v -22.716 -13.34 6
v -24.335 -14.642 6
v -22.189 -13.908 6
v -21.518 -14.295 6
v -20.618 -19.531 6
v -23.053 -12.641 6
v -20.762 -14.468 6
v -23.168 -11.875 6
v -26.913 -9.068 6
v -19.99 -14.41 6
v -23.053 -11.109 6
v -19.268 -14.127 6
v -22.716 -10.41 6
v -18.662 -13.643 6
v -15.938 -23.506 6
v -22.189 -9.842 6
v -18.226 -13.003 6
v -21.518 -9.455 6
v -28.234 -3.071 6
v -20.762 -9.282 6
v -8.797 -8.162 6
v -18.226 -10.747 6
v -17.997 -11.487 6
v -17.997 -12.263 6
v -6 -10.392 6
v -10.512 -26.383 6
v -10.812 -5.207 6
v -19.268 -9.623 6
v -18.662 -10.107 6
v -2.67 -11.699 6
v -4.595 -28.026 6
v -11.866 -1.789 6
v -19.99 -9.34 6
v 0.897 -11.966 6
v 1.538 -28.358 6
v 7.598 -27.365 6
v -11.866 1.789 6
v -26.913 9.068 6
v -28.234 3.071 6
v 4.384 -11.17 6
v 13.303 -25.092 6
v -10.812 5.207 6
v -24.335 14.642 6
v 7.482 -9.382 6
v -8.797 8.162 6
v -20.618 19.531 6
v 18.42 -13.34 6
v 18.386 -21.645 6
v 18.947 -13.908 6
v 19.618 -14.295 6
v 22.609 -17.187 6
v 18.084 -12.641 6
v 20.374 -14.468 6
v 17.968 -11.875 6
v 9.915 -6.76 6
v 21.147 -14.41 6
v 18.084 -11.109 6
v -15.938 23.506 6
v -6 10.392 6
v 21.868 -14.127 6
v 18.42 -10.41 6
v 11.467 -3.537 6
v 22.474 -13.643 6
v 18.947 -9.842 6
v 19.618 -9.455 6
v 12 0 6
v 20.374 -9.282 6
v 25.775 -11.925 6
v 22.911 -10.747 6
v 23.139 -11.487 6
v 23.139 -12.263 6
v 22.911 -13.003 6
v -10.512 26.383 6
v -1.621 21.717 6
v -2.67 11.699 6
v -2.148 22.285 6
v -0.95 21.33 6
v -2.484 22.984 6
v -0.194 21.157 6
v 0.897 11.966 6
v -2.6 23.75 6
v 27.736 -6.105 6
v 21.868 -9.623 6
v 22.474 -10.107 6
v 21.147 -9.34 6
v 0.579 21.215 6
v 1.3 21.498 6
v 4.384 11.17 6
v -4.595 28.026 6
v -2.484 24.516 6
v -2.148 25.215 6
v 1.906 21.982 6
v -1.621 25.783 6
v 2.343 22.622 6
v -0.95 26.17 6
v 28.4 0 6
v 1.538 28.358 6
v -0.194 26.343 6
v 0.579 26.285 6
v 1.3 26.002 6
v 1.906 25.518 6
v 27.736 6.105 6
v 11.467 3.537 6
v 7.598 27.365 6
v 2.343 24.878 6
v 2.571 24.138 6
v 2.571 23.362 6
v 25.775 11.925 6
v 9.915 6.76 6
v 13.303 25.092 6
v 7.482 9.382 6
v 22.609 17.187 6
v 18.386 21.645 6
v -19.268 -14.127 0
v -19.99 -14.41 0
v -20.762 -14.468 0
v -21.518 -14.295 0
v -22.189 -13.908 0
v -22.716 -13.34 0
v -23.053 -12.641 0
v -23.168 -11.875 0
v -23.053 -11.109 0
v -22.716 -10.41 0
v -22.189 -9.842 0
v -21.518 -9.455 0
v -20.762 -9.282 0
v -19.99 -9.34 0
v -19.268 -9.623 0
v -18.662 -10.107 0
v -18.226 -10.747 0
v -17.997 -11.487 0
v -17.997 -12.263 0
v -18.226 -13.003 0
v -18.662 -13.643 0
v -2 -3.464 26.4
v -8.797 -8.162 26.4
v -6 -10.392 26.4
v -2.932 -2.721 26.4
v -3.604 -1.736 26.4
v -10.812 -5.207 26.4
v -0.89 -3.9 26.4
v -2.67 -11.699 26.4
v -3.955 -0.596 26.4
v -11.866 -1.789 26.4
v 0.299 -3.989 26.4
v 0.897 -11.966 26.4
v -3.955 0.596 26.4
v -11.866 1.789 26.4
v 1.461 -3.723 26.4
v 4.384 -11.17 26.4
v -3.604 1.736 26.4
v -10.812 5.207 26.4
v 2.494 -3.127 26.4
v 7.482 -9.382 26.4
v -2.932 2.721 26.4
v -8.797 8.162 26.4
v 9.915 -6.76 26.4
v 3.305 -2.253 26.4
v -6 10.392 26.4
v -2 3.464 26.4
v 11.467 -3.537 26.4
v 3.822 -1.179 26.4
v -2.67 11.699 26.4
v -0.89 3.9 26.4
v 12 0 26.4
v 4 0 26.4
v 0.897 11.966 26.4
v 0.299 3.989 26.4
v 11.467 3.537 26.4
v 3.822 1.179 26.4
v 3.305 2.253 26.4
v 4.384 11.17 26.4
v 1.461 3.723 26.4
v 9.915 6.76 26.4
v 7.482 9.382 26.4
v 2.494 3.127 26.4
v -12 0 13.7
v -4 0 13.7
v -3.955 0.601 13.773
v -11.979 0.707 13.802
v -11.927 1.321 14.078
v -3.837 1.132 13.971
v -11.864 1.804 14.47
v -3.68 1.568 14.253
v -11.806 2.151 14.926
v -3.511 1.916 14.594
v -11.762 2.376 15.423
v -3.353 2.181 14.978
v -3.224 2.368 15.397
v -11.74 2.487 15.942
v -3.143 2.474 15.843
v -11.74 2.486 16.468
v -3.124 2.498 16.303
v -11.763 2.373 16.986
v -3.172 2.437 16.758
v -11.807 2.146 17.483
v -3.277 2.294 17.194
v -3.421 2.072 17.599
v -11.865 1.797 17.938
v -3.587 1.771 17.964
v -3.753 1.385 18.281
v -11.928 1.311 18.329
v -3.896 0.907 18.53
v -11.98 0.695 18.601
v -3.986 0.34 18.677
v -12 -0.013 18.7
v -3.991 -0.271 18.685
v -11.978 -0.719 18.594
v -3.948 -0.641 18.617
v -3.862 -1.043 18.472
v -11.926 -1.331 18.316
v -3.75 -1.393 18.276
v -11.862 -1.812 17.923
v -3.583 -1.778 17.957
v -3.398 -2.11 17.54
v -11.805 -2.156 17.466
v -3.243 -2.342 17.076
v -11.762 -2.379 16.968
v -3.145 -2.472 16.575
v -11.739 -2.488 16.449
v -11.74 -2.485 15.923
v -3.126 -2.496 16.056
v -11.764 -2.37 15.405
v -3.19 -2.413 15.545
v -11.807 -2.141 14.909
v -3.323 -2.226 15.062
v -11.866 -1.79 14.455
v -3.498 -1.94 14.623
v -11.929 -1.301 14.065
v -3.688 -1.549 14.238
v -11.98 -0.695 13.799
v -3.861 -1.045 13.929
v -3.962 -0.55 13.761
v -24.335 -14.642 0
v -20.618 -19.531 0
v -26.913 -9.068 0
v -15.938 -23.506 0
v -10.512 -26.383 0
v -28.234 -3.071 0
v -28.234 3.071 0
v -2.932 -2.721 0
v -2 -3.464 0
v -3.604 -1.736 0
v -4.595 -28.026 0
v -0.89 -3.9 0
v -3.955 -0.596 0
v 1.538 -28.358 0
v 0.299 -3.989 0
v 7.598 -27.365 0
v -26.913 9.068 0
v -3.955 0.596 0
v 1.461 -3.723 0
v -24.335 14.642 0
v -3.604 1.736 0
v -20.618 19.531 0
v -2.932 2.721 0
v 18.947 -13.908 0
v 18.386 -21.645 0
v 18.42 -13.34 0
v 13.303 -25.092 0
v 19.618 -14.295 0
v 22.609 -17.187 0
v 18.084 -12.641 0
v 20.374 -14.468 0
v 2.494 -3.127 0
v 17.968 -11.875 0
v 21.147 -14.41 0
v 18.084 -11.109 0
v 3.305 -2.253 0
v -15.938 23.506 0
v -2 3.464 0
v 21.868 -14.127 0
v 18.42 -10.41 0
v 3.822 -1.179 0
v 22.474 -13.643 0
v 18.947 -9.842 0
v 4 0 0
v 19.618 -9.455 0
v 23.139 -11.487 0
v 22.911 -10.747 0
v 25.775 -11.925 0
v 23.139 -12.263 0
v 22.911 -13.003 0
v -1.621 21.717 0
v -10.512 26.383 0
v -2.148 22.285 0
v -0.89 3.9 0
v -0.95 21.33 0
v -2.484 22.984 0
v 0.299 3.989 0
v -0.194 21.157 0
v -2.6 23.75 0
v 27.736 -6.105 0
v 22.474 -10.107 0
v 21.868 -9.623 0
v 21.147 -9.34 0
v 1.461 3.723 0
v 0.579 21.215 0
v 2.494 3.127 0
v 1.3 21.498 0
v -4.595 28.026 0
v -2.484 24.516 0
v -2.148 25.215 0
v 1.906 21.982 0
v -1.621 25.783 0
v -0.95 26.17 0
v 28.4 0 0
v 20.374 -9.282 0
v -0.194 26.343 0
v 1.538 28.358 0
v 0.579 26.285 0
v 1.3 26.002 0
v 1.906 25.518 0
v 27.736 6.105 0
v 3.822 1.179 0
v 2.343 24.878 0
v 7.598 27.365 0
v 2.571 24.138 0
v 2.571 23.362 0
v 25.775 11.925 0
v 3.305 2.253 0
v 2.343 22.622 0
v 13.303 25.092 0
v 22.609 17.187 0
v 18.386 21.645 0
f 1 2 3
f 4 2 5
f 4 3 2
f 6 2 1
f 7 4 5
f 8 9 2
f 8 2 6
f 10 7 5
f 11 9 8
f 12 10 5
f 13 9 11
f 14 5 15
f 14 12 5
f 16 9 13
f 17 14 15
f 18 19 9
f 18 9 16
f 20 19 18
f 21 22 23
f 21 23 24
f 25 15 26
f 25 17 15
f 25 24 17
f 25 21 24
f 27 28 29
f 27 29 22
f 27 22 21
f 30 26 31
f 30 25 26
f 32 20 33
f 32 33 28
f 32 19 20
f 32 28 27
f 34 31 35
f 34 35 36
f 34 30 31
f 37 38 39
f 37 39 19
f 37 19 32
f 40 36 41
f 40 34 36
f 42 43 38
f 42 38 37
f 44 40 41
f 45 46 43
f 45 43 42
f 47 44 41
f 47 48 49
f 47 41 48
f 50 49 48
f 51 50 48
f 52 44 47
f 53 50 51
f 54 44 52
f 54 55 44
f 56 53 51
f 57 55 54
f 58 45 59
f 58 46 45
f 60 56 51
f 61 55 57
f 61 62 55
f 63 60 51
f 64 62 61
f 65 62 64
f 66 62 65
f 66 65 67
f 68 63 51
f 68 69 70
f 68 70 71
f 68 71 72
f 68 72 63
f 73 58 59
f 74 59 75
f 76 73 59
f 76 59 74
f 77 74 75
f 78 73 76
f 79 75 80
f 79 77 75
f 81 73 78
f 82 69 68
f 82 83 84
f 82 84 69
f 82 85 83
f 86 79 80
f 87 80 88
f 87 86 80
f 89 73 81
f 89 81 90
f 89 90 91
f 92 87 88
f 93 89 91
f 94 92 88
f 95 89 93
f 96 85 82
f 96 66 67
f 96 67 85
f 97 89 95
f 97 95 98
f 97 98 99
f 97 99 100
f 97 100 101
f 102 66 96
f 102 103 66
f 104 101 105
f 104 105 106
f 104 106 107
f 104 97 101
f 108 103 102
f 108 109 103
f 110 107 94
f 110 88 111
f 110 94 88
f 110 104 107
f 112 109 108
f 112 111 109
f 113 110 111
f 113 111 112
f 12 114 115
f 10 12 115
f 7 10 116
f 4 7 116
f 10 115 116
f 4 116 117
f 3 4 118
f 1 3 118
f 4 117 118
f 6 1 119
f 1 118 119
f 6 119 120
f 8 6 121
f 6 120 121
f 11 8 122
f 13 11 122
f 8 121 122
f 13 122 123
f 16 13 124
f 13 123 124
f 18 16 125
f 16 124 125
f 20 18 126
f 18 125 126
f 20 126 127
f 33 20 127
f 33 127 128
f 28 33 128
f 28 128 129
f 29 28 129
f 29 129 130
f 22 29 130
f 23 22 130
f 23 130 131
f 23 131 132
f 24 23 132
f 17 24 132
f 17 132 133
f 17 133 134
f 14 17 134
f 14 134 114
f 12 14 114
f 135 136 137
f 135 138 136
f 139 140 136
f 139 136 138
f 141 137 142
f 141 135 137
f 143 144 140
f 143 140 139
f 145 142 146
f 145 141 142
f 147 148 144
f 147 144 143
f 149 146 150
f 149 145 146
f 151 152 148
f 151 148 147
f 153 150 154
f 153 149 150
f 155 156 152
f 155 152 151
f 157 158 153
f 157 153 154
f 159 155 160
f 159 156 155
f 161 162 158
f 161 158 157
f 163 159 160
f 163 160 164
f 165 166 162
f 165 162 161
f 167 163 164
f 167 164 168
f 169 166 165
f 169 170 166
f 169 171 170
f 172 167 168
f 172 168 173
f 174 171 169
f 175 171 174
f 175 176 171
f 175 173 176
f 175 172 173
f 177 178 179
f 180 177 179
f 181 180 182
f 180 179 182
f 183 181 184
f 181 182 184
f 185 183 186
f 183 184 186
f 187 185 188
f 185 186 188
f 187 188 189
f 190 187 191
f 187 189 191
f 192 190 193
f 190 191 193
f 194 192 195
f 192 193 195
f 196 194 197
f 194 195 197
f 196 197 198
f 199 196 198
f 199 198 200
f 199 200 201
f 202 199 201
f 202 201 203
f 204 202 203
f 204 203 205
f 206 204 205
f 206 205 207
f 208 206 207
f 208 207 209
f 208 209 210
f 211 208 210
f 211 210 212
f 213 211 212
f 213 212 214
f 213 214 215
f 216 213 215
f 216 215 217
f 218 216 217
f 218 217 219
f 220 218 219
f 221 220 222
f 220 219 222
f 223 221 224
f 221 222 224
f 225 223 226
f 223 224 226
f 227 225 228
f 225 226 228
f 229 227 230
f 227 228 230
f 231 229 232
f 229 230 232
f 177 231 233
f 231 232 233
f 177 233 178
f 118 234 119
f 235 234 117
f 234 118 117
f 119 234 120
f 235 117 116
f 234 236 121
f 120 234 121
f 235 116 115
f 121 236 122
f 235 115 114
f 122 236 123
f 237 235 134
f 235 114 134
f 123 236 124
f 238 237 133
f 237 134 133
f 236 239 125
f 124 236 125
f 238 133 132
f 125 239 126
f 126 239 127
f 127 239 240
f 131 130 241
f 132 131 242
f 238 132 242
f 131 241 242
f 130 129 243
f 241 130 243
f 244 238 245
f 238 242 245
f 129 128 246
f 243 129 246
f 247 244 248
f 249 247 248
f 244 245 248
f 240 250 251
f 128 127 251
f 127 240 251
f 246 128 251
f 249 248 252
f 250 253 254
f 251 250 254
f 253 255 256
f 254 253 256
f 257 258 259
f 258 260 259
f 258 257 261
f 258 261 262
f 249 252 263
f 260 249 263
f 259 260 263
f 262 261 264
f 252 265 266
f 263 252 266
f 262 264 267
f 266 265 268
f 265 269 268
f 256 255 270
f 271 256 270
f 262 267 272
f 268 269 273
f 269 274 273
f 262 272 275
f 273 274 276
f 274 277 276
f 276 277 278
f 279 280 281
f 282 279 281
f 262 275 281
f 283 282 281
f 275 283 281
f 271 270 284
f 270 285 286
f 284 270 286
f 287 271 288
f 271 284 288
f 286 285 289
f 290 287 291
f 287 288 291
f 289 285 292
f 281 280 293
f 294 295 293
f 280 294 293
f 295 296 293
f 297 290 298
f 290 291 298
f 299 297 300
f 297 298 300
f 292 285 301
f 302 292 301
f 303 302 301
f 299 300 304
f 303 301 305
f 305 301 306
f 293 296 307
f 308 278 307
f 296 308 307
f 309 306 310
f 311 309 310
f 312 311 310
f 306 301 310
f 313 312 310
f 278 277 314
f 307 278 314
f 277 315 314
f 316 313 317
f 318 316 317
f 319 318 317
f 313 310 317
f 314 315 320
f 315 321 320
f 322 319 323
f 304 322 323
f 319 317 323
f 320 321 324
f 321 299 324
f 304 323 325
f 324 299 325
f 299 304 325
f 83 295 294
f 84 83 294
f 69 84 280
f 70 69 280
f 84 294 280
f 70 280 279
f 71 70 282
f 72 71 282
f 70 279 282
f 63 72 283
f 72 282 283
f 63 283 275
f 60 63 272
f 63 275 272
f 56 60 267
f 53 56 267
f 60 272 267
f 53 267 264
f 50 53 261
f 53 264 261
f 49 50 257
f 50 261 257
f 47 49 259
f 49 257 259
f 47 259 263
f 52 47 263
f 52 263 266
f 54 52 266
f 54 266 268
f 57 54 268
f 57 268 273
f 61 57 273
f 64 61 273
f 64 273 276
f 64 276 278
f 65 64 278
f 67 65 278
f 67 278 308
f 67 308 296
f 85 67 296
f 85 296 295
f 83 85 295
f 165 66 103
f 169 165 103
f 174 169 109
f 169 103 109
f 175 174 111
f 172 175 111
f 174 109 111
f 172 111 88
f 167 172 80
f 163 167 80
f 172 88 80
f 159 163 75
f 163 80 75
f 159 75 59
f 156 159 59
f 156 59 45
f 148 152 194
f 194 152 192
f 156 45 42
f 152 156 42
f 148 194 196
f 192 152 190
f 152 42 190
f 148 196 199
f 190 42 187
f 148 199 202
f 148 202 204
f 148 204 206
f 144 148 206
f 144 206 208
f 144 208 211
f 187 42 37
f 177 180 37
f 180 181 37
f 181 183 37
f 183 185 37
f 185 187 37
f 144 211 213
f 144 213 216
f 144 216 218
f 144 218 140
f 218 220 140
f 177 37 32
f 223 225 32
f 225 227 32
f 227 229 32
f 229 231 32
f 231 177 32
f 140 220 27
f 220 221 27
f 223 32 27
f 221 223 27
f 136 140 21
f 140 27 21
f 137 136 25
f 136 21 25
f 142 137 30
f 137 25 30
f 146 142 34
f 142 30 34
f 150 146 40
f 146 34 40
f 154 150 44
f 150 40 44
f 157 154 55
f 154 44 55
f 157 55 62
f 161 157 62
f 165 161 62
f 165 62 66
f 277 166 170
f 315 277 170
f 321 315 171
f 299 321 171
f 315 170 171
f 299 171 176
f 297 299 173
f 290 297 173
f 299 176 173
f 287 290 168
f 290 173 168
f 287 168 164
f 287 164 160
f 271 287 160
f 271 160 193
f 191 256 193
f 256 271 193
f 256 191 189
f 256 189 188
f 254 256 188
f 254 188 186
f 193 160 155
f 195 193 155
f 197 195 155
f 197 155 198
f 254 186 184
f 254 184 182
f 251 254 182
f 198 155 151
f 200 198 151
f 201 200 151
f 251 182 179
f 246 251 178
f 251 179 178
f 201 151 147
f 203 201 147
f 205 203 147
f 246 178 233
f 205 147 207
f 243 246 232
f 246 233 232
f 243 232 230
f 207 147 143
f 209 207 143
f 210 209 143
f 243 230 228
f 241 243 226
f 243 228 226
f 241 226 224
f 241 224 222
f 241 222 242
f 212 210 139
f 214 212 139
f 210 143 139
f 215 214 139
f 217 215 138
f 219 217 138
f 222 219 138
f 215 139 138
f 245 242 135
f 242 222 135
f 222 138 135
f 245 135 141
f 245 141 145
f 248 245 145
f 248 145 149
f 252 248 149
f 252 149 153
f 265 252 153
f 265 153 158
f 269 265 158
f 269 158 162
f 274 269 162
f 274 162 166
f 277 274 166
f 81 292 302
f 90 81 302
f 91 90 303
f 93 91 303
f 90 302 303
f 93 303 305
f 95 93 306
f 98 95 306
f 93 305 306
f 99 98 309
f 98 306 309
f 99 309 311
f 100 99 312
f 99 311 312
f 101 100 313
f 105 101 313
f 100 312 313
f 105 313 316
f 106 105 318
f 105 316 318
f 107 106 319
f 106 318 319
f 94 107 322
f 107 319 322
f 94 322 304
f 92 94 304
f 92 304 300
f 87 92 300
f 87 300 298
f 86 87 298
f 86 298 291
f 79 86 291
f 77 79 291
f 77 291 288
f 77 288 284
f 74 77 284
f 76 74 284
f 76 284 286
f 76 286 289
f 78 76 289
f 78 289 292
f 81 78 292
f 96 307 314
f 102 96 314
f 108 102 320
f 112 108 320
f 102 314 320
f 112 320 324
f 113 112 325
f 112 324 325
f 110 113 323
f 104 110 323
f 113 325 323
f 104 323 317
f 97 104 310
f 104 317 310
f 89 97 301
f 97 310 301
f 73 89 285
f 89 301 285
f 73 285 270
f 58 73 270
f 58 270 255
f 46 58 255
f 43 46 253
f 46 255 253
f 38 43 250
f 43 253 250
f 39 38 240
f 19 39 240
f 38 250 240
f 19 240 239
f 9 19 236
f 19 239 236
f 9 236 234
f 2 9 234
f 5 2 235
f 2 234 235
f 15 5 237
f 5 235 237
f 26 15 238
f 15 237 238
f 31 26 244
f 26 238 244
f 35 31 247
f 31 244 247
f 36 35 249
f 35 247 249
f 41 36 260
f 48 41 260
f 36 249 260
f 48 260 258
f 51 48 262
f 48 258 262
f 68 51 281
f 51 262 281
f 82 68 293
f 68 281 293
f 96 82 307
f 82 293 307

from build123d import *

# Parameters (mm, degrees)
SKETCH2_R           = 28.4
BOSS_EXTRUDE1_DEPTH = 6
SKETCH3_R           = 12
BOSS_EXTRUDE2_DEPTH = 20.4
SKETCH4_R           = 4
CUT_EXTRUDE1_DEPTH  = 49.063291606
SKETCH5_R           = 2.6
CUT_EXTRUDE2_DEPTH  = 49.063291606
CIRPATTERN2_COUNT   = 3
SKETCH6_R           = 2.5
CUT_EXTRUDE3_DEPTH  = 49.063291606


with BuildPart() as part:
    # Sketch2 → Boss-Extrude1 (new body)
    with BuildSketch(Plane.XY):
        Circle(SKETCH2_R)
    extrude(amount=BOSS_EXTRUDE1_DEPTH)

    # Sketch3 → Boss-Extrude2 (add)
    with BuildSketch(Plane.XY.offset(6)):
        Circle(SKETCH3_R)
    extrude(amount=BOSS_EXTRUDE2_DEPTH)

    # Sketch4 → Cut-Extrude1 (cut, through all)
    with BuildSketch(Plane.XY.offset(26.4)):
        Circle(SKETCH4_R)
    extrude(amount=-CUT_EXTRUDE1_DEPTH, mode=Mode.SUBTRACT)

    # Sketch5 → Cut-Extrude2 (cut, through all)
    with BuildSketch(Plane(origin=(0, 0, 0), x_dir=(-1, 0, 0), z_dir=(0, 0, -1))):
        with Locations((0, 23.75)):
            Circle(SKETCH5_R)
    cut_extrude2 = extrude(amount=-CUT_EXTRUDE2_DEPTH, mode=Mode.SUBTRACT)

    # CirPattern2: Cut-Extrude2 ×3 about axis
    cirpattern2_axis = Axis((0, 0, 0), (0, 0, 1))
    for i in range(1, CIRPATTERN2_COUNT):
        add(cut_extrude2.rotate(cirpattern2_axis, i * 360 / CIRPATTERN2_COUNT), mode=Mode.SUBTRACT)

    # Sketch6 → Cut-Extrude3 (cut, through all)
    with BuildSketch(Plane(origin=(0, 0, 0), x_dir=(0, 0, -1), z_dir=(1, 0, 0))):
        with Locations((-16.2, 0)):
            Circle(SKETCH6_R)
    extrude(amount=-CUT_EXTRUDE3_DEPTH, mode=Mode.SUBTRACT)


solid = part.part
